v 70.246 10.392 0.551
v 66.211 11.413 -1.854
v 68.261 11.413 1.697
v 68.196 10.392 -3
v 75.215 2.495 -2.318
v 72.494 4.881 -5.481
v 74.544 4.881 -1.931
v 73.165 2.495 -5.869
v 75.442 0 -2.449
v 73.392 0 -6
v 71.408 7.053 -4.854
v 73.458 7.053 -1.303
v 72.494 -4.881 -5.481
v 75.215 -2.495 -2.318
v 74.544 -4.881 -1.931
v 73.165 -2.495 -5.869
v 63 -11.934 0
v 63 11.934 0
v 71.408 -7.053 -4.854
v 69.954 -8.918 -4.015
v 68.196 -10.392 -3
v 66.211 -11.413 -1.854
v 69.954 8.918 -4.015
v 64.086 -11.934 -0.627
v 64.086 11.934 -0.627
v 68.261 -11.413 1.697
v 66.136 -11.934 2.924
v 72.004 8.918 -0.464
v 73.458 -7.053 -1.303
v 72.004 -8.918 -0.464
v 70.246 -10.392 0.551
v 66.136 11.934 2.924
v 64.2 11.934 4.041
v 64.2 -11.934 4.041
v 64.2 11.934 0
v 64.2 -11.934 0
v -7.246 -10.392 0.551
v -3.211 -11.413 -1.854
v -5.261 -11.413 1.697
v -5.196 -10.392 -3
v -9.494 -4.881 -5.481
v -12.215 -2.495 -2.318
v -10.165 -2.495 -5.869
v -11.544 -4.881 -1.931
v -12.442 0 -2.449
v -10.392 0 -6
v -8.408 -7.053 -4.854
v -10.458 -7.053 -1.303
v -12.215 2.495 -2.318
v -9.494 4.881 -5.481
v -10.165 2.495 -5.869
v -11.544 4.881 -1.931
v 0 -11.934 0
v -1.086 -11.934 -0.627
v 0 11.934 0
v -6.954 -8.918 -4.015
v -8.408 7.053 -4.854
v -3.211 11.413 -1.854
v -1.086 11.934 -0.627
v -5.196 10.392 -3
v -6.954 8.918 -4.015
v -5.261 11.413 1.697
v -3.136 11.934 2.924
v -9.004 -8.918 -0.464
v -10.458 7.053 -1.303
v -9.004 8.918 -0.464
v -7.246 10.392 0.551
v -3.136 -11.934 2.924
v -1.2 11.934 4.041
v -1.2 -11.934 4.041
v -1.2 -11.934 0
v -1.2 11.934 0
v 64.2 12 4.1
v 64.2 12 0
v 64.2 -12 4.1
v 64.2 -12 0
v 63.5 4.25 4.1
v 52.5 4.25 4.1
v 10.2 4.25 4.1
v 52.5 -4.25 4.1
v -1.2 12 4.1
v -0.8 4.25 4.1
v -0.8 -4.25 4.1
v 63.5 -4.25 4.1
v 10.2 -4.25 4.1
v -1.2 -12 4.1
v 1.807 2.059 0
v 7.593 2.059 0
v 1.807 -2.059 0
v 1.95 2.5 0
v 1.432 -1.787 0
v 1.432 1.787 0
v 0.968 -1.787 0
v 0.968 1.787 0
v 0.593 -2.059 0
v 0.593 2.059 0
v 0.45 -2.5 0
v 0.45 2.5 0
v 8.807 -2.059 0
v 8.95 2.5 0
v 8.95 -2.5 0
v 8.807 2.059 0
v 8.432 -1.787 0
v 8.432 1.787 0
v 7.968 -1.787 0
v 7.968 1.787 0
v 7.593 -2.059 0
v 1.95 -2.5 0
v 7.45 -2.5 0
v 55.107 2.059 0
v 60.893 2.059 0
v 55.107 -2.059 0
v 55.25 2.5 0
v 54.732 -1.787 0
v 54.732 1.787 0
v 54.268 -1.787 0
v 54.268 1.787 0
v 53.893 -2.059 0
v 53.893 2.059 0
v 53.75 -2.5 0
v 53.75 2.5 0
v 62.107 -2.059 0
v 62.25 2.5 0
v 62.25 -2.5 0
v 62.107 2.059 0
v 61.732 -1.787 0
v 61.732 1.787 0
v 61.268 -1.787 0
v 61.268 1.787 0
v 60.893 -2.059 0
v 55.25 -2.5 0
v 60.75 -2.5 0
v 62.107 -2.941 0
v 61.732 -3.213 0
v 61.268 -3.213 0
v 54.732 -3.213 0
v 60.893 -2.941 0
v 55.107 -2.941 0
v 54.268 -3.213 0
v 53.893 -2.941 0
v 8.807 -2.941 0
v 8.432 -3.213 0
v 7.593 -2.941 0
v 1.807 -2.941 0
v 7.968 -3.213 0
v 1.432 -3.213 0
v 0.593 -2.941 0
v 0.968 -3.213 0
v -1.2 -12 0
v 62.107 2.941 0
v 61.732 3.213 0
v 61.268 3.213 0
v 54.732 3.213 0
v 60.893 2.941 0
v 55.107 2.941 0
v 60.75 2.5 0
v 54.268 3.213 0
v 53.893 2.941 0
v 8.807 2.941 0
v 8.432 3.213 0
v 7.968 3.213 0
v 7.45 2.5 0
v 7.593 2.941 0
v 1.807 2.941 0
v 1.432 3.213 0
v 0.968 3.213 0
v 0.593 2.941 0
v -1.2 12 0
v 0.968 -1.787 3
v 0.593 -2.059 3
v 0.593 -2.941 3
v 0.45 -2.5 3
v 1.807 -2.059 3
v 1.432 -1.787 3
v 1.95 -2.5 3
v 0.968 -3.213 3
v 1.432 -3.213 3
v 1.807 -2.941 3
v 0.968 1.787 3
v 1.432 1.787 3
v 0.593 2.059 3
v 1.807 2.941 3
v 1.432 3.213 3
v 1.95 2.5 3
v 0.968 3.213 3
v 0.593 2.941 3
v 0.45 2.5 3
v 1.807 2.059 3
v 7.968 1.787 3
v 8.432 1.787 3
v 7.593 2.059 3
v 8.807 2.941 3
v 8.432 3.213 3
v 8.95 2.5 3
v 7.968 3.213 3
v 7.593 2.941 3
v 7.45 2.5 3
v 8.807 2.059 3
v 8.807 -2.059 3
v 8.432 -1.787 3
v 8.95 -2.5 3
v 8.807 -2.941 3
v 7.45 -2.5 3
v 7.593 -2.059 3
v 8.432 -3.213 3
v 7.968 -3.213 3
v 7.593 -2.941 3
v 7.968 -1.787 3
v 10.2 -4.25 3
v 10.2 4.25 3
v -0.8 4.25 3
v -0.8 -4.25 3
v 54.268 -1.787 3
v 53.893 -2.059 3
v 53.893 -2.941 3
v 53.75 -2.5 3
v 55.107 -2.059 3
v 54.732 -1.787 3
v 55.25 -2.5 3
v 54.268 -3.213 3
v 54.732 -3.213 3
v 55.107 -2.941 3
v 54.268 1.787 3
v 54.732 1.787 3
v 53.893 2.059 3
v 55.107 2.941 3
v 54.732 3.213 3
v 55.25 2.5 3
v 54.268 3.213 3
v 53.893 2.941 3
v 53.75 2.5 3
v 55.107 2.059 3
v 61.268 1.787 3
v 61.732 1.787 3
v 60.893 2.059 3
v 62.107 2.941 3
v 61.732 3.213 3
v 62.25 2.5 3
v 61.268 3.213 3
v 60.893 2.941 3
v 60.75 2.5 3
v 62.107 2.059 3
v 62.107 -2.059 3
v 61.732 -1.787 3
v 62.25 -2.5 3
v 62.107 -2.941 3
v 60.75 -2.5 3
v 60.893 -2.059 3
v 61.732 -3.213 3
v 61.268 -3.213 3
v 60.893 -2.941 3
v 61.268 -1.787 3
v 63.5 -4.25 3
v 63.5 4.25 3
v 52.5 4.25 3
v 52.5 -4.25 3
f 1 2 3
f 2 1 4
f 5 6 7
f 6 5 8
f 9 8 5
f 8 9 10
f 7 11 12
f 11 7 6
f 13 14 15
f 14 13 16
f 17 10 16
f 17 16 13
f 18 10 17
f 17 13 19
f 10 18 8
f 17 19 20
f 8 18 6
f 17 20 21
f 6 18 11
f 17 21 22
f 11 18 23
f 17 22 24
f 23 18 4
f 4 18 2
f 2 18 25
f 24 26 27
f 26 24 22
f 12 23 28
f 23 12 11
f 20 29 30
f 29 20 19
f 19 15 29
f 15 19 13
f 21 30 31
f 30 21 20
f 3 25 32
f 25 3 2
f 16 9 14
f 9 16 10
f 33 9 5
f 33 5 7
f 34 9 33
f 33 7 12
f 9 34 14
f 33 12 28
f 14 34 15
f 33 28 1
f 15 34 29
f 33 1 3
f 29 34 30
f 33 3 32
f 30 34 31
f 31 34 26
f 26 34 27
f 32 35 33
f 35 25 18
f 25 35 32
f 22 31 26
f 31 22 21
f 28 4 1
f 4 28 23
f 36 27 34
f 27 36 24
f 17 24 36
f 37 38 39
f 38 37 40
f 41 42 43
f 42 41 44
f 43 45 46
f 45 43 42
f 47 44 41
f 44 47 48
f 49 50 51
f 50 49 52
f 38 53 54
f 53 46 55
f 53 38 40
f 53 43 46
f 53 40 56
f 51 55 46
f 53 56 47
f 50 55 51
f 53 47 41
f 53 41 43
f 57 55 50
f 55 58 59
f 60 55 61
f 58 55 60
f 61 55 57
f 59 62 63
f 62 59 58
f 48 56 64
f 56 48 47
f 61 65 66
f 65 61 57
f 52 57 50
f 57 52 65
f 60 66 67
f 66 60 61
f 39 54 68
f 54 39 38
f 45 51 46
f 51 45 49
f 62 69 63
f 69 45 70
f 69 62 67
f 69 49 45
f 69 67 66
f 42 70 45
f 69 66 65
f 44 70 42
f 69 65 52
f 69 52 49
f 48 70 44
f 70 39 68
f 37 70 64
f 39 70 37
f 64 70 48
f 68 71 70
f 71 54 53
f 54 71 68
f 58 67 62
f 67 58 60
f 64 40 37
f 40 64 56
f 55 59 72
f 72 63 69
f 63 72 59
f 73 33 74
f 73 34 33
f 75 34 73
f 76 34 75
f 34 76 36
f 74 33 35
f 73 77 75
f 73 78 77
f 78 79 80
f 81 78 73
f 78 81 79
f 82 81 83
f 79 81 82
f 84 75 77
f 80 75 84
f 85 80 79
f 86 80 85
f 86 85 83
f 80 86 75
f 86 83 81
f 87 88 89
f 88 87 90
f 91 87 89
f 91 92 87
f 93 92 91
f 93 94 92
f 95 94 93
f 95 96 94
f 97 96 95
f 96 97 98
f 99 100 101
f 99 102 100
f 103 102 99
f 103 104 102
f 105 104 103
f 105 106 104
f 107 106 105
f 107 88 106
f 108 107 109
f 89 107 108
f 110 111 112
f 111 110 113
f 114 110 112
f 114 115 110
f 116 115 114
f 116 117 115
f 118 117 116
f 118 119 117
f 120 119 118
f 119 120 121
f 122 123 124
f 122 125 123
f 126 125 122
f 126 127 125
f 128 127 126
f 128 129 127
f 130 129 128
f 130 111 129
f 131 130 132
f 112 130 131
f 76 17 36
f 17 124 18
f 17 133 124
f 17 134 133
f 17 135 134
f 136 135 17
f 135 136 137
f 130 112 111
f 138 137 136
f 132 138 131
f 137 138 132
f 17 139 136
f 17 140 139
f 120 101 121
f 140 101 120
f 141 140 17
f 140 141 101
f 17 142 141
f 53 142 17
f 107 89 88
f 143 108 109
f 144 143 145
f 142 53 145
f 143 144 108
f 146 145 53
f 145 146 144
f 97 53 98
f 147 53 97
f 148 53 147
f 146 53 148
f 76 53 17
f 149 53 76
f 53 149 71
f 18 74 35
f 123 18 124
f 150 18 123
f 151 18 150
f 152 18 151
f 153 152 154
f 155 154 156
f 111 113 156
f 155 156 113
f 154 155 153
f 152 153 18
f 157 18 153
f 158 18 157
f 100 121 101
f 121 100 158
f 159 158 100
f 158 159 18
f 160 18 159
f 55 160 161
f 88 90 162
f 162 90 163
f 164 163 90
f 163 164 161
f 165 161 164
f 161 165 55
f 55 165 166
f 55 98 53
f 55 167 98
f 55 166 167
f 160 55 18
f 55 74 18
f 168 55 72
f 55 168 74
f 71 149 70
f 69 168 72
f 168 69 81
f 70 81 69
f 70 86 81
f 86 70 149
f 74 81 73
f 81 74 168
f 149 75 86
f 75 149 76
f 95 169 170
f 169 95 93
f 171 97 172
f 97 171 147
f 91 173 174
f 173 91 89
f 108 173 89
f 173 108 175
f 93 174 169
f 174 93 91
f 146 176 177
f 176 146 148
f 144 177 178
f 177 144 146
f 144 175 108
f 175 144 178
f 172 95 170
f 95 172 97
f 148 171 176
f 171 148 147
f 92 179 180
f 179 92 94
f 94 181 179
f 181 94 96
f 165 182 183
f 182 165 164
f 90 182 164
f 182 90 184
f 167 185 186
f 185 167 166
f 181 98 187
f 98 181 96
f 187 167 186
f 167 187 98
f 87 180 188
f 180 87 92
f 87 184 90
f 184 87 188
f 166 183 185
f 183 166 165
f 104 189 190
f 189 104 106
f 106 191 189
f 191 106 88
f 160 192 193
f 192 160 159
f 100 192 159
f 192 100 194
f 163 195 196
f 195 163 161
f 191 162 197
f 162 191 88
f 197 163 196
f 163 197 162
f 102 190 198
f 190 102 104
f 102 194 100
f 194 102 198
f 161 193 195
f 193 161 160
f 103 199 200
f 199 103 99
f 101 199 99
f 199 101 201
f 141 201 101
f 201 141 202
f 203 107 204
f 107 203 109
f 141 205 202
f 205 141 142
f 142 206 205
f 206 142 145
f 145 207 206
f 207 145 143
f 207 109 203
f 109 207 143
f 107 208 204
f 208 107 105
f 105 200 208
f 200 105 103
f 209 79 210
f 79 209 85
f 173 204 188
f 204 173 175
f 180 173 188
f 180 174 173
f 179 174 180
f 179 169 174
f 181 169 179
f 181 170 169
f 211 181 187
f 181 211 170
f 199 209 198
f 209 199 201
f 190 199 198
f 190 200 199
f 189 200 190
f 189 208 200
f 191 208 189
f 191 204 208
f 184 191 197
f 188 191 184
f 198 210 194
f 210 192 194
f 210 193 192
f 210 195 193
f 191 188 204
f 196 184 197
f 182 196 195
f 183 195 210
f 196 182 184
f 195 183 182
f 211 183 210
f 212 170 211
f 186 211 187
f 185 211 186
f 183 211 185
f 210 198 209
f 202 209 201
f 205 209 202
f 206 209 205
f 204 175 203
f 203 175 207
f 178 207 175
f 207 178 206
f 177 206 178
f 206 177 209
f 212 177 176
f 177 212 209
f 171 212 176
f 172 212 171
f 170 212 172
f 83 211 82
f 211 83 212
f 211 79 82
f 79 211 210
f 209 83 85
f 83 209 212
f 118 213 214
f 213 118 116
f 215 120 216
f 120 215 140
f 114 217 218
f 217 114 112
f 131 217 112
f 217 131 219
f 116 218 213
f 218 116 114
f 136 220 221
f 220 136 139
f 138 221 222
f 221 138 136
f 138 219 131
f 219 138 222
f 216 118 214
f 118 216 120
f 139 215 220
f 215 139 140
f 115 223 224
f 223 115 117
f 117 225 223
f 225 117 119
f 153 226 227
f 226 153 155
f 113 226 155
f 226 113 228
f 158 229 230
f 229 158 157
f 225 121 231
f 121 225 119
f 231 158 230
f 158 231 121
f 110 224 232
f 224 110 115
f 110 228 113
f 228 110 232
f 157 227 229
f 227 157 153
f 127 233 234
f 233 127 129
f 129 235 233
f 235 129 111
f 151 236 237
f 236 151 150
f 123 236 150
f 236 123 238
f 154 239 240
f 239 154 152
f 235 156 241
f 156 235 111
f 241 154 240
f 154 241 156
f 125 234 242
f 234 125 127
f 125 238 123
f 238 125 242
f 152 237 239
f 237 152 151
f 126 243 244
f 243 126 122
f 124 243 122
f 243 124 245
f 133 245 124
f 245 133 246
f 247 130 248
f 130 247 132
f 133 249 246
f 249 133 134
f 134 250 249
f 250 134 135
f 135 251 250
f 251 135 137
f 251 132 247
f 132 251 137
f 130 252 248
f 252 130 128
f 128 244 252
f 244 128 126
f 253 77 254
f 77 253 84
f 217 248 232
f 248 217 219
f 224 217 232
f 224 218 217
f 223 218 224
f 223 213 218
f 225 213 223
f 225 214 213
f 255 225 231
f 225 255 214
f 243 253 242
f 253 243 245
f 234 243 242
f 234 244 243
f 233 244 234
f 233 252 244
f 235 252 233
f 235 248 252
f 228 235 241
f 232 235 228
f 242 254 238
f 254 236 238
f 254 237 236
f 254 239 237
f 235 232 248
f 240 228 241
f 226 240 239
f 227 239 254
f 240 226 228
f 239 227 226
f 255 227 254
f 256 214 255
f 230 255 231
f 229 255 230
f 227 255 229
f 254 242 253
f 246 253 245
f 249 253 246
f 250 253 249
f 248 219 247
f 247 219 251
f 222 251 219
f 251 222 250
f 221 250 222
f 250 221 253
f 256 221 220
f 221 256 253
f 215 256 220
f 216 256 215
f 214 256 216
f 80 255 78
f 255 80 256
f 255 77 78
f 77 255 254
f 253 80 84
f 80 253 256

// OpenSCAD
	techdeck();


module techdeck(){


difference(){

union(){
	translate([63,0,0]) rocker();
	translate([-1.2,0,0])translate([0,-24/2,0])cube([63+2.4,24,4.1]);
	rotate([0,0,180])rocker();
}

translate([1.2,0,0]) #holeset();
translate([63+2.4+0.1-11,0,0]) #holeset();

}

}


module holeset(){
$fn=10;
translate([0,-2.5,-3]){
translate([0,0,0]) cylinder(r=0.75,h=10);
translate([0,5,0]) cylinder(r=0.75,h=10);
translate([7,5,0]) cylinder(r=0.75,h=10);
translate([7,0,0]) cylinder(r=0.75,h=10);


}
translate([-11/2+7/2,-8.5/2,3]){
cube([11,8.5,2]);
}

}

module rocker(){
rotate([0,30,0])
difference(){
	cylinder(h=4.1,r=12);
	translate([-25,-12,0])cube([24,24,4.1]);
}	
}
